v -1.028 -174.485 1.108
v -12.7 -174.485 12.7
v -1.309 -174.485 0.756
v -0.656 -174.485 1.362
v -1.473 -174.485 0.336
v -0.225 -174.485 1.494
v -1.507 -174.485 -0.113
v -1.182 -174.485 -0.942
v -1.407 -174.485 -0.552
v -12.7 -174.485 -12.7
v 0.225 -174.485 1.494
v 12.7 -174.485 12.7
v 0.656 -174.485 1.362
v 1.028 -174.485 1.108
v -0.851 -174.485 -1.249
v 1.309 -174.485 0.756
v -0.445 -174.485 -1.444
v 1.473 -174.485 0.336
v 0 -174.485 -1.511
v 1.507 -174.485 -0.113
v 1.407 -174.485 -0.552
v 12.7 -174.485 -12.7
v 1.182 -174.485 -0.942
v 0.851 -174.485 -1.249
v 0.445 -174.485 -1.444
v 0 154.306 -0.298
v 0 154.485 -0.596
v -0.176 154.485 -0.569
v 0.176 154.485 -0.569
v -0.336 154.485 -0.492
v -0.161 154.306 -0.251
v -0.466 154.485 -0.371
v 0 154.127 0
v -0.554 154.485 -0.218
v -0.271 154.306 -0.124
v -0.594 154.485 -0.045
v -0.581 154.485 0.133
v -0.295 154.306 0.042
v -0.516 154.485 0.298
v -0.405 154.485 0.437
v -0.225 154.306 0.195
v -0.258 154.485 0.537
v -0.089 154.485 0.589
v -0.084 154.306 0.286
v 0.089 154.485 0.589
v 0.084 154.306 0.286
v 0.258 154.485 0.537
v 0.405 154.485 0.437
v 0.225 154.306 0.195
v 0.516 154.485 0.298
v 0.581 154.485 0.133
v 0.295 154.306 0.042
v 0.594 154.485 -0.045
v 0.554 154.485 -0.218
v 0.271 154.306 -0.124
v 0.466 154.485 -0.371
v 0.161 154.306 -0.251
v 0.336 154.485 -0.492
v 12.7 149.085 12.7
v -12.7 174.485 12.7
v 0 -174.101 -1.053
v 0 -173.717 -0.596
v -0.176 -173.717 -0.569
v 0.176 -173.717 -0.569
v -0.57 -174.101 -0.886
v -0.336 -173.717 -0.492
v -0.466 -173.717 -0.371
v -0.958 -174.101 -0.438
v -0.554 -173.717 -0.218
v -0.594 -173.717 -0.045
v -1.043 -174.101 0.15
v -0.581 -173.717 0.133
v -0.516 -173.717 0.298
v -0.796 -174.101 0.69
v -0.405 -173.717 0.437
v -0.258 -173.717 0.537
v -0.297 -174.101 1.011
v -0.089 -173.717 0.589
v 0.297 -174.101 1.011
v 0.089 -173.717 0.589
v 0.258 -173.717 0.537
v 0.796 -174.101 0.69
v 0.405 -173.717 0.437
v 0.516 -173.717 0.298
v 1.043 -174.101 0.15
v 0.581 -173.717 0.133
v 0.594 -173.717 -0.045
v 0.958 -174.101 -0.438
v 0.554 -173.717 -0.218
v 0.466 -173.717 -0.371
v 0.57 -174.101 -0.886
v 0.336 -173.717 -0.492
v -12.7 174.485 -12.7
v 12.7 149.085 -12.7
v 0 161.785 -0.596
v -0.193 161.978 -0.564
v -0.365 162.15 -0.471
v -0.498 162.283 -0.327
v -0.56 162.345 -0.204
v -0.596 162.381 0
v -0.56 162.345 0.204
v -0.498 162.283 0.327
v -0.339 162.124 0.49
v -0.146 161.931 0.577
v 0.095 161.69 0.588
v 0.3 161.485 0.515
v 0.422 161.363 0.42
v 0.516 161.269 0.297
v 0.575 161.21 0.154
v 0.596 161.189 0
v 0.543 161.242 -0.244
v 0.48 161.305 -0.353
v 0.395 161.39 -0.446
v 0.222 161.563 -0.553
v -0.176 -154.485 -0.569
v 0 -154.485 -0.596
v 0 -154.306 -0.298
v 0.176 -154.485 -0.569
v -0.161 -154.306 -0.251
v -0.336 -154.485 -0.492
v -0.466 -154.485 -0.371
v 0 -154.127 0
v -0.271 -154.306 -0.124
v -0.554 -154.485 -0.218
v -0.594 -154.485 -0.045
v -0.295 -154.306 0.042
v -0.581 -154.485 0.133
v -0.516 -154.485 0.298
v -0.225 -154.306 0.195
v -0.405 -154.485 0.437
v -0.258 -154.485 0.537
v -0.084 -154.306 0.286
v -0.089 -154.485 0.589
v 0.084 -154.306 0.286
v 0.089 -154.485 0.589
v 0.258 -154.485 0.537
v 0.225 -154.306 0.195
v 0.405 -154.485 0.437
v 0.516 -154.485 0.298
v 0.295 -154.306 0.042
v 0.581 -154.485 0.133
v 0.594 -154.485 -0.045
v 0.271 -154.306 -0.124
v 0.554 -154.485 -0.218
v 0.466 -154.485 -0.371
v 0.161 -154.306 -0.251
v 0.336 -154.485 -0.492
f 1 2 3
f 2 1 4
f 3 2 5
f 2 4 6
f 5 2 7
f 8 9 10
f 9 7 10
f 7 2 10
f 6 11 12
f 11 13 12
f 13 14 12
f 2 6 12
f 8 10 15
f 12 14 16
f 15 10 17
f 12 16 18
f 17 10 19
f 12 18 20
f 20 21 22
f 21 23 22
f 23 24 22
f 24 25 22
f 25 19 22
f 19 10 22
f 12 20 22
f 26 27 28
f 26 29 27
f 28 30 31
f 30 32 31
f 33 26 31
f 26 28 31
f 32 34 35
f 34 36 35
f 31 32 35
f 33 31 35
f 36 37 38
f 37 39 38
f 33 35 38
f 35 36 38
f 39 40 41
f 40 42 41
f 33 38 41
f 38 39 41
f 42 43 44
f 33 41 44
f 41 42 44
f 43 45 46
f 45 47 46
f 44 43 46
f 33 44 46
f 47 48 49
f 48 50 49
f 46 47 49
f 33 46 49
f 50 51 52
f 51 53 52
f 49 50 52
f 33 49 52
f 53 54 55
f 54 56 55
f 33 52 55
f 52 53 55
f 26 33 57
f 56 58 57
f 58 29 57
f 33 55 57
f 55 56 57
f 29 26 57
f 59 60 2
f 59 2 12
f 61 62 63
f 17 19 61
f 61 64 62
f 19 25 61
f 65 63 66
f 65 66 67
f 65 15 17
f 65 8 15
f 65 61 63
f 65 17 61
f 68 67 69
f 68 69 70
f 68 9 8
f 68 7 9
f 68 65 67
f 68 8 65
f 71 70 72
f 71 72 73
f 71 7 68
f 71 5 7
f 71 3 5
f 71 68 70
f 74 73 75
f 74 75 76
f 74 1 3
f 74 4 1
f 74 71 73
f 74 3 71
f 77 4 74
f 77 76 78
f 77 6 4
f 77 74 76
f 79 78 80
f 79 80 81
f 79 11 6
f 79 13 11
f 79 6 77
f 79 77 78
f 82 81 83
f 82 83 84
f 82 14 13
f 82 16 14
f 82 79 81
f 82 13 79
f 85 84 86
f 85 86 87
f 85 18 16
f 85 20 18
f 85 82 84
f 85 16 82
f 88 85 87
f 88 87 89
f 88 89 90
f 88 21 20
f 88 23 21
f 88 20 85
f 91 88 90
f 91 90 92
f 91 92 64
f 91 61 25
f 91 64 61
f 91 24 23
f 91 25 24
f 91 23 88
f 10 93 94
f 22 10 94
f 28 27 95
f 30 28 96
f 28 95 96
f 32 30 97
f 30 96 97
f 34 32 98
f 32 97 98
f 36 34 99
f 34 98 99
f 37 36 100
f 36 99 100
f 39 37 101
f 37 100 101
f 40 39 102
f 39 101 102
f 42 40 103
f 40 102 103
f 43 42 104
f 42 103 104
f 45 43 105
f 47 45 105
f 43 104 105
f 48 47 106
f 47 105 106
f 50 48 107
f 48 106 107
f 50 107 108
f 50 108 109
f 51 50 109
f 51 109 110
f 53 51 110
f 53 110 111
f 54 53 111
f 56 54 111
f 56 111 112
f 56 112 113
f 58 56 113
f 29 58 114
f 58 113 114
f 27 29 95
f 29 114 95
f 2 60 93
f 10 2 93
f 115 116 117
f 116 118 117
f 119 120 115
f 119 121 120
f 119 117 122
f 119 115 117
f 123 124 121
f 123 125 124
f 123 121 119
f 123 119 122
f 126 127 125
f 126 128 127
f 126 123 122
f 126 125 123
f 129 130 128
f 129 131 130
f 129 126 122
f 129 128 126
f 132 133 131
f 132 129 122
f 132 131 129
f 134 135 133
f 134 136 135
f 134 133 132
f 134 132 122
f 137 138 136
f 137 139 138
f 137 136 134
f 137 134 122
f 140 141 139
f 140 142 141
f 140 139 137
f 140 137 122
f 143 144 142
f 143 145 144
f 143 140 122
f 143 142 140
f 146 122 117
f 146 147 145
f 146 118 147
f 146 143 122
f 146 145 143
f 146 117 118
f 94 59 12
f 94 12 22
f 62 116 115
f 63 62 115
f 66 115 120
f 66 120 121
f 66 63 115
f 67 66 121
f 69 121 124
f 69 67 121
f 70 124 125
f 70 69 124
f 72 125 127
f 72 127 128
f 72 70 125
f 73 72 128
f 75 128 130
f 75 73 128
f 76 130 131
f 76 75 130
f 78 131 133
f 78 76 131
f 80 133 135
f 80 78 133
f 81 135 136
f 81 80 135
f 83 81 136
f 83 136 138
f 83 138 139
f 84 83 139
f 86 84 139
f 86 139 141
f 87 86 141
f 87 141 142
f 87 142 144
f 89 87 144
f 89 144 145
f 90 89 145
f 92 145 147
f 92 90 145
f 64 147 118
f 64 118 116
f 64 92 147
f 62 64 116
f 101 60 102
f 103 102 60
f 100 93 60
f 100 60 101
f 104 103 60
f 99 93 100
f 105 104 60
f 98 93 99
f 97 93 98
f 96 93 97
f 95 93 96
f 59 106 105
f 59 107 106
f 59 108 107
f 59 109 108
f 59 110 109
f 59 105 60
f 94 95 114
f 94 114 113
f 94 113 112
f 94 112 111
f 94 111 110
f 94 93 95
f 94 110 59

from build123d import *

# Parameters (mm, degrees)
SKETCH1_W               = 25.4
SKETCH1_H               = 25.4
BOSS_EXTRUDE1_DEPTH     = 174.485
CUT_EXTRUDE1_DEPTH      = 13.7
CUT_EXTRUDE1_DEPTH_BACK = 13.7


with BuildPart() as part:
    # Sketch1 → Boss-Extrude1 (new body, symmetric)
    with BuildSketch(Plane(origin=(0, 0, 0), x_dir=(1, 0, 0), z_dir=(0, 1, 0))):
        Rectangle(SKETCH1_W, SKETCH1_H)
    extrude(amount=BOSS_EXTRUDE1_DEPTH, both=True)

    # Sketch3 → #0-80 Tapped Hole1 (revolve, cut)
    with BuildSketch(Plane(origin=(0, -174.485, 0), x_dir=(0, 0, -1), z_dir=(1, 0, 0))):
        Polygon((0, 0), (0, 20.357890611), (0.59563, 20), (0.59563, 0.768338359), (1.5113, 0), align=None)
    f_0_80_tapped_hole1 = revolve(axis=Axis((0, -180.835, 0), (0, 1, 0)), mode=Mode.SUBTRACT)

    # Mirror1: #0-80 Tapped Hole1 across plane
    add(f_0_80_tapped_hole1.mirror(Plane.ZX), mode=Mode.SUBTRACT)

    # Sketch4 → Cut-Extrude1 (cut, two sides)
    with BuildSketch(Plane.XY) as cut_extrude1_sk:
        Polygon((12.7, 174.485), (-12.7, 174.485), (12.7, 149.085), align=None)
    extrude(amount=CUT_EXTRUDE1_DEPTH, mode=Mode.SUBTRACT)
    extrude(cut_extrude1_sk.sketch, amount=-CUT_EXTRUDE1_DEPTH_BACK, mode=Mode.SUBTRACT)


solid = part.part
